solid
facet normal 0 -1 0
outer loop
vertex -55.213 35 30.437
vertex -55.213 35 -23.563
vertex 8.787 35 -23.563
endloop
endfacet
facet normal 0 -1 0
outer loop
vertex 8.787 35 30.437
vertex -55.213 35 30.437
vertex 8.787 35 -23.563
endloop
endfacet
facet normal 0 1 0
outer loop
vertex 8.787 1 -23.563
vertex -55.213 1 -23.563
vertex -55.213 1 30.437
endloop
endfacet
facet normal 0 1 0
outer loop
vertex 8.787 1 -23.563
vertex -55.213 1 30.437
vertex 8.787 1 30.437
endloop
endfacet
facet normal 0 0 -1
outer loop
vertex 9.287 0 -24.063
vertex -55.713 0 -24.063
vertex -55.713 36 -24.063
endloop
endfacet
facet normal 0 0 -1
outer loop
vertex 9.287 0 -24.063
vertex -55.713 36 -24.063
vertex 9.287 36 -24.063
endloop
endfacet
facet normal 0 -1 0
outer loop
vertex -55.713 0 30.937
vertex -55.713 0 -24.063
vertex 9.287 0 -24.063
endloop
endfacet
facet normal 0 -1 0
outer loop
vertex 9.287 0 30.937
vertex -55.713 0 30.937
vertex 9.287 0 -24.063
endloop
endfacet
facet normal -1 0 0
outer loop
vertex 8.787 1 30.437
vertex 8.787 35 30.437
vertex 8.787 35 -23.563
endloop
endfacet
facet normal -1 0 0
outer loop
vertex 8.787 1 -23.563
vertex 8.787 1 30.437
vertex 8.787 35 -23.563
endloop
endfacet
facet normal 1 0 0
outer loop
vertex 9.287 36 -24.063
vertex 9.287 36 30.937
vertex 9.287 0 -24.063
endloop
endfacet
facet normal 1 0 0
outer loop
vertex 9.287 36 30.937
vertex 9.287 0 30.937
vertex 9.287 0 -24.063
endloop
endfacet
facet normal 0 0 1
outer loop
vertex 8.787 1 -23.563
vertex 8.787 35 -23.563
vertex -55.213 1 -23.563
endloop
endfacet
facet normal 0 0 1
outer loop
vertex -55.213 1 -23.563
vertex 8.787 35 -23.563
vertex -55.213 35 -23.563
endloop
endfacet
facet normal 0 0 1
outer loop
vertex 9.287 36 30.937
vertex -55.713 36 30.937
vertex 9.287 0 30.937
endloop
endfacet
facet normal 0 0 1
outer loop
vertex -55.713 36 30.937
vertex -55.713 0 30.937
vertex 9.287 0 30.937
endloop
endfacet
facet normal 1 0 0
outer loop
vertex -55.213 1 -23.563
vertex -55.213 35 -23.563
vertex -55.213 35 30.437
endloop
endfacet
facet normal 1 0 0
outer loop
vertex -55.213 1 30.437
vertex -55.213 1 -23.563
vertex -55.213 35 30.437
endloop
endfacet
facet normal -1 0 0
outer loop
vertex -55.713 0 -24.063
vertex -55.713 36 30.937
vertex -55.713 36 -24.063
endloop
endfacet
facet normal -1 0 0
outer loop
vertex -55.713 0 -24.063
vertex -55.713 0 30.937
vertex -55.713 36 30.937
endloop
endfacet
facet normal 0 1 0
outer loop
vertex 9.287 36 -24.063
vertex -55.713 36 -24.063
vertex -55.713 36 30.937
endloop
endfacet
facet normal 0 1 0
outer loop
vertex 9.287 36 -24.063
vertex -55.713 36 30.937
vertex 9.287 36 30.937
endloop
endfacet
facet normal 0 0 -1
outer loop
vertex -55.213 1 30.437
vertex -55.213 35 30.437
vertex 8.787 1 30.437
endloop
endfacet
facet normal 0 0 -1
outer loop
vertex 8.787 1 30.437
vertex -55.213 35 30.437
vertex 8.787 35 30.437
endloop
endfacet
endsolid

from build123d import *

# Parameters (mm, degrees)
SKETCH_1_W          = 65
SKETCH_1_H          = 55
EXTRUDE_1_DEPTH     = 35
CUT_EXTRUDE_1_DEPTH = 34
SKETCH_3_W          = 65
SKETCH_3_H          = 55
EXTRUDE_2_DEPTH     = 1


with BuildPart() as part:
    # Эскиз1 → Бобышка-Вытянуть1 (new body)
    with BuildSketch(Plane(origin=(0, 0, 0), x_dir=(1, 0, 0), z_dir=(0, 1, 0))):
        with Locations((-23.213428901, -3.437024221)):
            Rectangle(SKETCH_1_W, SKETCH_1_H)
    extrude(amount=EXTRUDE_1_DEPTH)

    # Эскиз2 → Вырез-Вытянуть1 (cut)
    with BuildSketch(Plane(origin=(0, 35, 0), x_dir=(1, 0, 0), z_dir=(0, 1, 0))):
        Polygon((-55.213428901, 23.562975779), (-55.213428901, -29.063319013), (-55.213428901, -30.437024221), (8.786571099, -30.437024221), (8.786571099, 23.562975779), align=None)
    extrude(amount=-CUT_EXTRUDE_1_DEPTH, mode=Mode.SUBTRACT)

    # Эскиз3 → Бобышка-Вытянуть2 (add)
    with BuildSketch(Plane(origin=(0, 35, 0), x_dir=(1, 0, 0), z_dir=(0, 1, 0))):
        with Locations((-23.213428901, -3.437024221)):
            Rectangle(SKETCH_3_W, SKETCH_3_H)
    extrude(amount=EXTRUDE_2_DEPTH)


solid = part.part
